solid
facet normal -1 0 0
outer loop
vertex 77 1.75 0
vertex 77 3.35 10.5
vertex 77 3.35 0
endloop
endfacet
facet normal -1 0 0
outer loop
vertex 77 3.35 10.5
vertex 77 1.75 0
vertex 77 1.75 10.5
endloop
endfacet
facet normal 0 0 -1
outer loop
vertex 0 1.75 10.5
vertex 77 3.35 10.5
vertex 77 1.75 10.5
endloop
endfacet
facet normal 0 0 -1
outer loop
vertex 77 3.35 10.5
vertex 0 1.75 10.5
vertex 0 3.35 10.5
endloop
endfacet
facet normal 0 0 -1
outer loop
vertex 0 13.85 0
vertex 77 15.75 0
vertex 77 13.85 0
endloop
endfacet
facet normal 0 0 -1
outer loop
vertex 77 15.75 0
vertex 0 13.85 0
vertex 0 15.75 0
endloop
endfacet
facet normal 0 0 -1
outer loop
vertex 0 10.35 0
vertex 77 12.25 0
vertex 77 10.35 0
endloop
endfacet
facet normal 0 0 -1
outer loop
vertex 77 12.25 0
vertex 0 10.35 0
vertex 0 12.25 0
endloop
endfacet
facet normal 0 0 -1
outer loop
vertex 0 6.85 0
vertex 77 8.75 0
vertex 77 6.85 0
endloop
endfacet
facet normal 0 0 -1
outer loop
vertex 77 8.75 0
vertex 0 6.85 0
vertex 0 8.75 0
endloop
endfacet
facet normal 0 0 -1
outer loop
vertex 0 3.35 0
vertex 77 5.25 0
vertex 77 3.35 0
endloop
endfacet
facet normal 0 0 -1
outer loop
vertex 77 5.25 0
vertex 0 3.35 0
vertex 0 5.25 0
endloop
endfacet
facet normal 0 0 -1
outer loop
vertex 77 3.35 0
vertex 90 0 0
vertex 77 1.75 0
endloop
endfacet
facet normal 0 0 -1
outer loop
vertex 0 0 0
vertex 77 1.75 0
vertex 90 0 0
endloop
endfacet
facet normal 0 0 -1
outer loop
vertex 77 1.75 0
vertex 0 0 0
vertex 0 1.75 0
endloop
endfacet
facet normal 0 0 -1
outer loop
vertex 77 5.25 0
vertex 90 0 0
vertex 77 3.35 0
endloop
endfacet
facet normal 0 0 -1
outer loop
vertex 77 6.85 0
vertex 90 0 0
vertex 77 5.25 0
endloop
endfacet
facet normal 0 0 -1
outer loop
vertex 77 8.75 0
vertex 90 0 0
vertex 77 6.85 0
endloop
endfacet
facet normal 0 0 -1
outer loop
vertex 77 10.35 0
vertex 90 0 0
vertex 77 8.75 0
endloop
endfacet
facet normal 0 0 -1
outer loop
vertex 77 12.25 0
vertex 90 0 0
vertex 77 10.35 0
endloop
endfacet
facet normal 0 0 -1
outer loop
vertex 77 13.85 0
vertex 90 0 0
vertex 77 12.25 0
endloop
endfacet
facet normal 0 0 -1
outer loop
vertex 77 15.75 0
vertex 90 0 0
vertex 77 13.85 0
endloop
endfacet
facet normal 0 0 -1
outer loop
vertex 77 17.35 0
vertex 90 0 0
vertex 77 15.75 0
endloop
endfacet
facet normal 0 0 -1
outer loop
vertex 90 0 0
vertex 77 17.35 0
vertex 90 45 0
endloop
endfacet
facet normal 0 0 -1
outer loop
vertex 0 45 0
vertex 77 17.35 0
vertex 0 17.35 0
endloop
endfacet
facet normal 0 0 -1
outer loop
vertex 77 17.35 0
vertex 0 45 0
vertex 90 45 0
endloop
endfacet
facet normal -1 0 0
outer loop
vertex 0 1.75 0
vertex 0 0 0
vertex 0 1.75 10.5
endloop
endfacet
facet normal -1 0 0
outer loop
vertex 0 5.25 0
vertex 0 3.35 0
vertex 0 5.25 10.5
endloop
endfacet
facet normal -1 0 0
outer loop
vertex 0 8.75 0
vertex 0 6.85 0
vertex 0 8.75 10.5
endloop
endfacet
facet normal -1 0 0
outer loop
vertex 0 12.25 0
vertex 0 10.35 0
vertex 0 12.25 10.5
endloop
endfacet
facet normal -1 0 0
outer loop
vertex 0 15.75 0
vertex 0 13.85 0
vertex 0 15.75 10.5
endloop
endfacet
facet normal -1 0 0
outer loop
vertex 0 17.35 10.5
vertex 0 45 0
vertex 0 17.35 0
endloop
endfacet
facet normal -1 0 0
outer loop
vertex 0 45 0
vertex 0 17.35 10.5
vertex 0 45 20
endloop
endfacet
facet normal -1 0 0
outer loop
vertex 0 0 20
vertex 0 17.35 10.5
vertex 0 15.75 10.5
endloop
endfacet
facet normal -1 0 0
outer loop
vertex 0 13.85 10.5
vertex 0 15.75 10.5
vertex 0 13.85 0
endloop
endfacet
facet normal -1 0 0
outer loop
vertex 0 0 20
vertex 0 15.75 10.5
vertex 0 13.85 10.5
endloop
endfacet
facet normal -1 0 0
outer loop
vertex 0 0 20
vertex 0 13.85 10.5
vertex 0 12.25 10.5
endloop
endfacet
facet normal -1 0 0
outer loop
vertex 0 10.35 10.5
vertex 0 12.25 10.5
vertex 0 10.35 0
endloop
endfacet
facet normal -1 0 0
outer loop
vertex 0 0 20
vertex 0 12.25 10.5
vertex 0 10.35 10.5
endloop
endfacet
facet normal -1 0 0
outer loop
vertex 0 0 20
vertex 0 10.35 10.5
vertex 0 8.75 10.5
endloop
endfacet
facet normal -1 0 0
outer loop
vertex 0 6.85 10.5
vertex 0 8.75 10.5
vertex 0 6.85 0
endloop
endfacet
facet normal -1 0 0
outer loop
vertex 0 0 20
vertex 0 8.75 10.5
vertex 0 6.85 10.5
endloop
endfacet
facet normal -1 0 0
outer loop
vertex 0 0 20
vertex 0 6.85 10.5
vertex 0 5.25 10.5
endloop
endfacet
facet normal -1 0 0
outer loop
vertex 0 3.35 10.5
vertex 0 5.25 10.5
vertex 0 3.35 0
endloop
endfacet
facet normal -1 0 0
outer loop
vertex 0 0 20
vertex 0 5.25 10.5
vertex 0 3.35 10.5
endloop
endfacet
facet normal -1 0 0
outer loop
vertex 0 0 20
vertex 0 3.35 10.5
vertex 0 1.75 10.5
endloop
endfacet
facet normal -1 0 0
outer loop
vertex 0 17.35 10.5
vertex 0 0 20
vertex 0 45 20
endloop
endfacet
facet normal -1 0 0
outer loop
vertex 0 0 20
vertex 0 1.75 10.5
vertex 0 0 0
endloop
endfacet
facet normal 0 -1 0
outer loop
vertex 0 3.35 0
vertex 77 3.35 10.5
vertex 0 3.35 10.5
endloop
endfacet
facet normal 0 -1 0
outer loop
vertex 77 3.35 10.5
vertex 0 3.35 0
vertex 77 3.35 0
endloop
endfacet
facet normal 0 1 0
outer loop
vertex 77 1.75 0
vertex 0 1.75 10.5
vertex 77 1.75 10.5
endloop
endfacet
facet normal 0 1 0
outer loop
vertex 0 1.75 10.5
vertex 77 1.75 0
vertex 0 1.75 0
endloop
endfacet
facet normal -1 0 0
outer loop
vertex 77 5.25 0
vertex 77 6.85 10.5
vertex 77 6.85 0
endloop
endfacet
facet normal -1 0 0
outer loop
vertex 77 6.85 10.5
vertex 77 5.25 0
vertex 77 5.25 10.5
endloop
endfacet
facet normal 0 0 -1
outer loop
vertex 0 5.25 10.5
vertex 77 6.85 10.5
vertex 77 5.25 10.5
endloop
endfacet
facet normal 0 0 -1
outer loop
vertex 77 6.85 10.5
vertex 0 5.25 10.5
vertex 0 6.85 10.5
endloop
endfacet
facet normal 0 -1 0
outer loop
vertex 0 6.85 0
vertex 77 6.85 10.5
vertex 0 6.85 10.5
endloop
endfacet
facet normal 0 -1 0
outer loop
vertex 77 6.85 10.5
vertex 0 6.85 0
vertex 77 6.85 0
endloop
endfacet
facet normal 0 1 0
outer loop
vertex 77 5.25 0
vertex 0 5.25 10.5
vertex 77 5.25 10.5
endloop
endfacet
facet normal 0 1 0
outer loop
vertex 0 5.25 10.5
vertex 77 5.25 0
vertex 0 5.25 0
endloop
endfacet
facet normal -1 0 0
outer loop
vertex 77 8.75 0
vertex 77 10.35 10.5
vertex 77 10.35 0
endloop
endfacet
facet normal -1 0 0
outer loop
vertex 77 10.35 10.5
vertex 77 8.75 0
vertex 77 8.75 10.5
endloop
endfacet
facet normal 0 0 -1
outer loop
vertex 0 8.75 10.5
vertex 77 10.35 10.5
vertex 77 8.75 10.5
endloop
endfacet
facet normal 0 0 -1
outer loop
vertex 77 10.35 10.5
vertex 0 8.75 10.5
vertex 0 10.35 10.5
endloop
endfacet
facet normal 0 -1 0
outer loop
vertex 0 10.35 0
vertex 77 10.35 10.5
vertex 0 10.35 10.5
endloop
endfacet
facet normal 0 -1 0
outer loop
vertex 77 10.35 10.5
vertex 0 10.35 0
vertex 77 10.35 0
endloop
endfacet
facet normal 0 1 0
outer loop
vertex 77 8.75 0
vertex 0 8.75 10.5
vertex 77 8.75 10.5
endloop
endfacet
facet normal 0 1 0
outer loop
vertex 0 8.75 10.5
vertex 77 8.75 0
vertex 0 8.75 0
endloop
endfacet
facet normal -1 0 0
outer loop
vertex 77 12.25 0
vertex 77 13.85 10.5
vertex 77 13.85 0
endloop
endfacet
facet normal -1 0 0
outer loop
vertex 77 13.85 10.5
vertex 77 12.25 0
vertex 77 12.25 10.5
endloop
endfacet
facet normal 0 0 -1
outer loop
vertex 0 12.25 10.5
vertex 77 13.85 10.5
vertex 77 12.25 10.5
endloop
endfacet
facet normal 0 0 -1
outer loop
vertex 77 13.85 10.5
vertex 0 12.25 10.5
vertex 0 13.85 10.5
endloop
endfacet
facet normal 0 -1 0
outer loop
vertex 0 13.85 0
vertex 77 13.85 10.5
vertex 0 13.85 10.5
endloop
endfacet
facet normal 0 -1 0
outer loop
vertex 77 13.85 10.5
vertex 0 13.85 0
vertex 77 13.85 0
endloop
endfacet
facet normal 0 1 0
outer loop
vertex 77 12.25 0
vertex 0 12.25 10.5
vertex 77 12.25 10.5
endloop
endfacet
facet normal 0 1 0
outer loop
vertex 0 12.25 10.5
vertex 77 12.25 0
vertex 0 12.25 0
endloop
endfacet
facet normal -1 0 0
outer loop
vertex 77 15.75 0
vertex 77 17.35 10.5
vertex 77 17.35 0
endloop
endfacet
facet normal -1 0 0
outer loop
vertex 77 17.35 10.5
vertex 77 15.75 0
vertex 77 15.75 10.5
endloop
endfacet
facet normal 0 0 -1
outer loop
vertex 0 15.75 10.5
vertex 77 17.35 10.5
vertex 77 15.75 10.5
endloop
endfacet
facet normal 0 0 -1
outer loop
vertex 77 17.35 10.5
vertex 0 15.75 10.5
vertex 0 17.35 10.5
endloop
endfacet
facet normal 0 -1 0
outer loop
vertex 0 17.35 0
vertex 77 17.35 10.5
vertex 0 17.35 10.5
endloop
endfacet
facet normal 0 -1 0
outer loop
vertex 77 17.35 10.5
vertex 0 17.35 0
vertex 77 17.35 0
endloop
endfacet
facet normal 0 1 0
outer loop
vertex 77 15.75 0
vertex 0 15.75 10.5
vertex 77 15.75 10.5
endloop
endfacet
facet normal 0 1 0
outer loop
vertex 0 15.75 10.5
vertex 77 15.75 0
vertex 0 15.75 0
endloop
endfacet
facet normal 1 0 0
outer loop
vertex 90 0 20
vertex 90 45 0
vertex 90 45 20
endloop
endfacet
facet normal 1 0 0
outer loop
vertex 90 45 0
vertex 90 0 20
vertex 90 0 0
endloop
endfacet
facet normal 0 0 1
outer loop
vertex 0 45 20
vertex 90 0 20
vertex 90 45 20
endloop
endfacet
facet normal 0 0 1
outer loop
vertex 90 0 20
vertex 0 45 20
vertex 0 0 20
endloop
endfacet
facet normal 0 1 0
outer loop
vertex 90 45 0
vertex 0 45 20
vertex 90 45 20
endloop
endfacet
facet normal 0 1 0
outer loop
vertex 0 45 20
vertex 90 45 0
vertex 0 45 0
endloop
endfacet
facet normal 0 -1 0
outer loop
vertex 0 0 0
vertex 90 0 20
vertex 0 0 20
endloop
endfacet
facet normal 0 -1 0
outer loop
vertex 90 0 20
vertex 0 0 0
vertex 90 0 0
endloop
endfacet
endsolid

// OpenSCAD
$fn = 128;

// --- Dimensions ---
// Base block dimensions
$base_length_X = 90;
$base_width_Y = 45;
$base_height_Z = 20;

// Slide dimensions (mm)
$slide_length = 75;
$slide_width = 25;
$slide_thickness = 1;

// Slot dimensions
$slot_length = 77;
$slot_width = 1.6;
$slot_depth = 10;

// Slot layout
$slot_count = 10;
$slot_spacing = 3.5; // centre-to-centre in Y
$group_centre_Y = 0; // Group of slots centred on block in Y

// --- Variables ---
// Calculate slot positions
// Total width of slots = slot_count * slot_width
// Total gap width = (slot_count - 1) * slot_spacing
// We need to center this group.
// The group of centers is at Y = group_centre_Y.
// Since we are using for loops with an offset, we can calculate the offset for the first slot.

// Calculate the offset for the first slot center to center the group
// The centers are at: y0, y0 + spacing, y0 + 2*spacing, ...
// The average of these centers should be 0.
// y0 + (slot_count - 1)/2 * spacing = 0
// y0 = - (slot_count - 1)/2 * spacing
$first_slot_offset = - (($slot_count - 1) / 2) * $slot_spacing;

// --- Build ---

difference() {
    
    // 1. Base Block
    // Rests on XY plane at z=0. Centred on origin.
    translate([0, 0, 0])
    cube([
        $base_length_X, 
        $base_width_Y, 
        $base_height_Z
    ]);

    // 2. Slots
    // Cut 10 parallel slots running along X.
    // Open at the top (Z direction).
    // Slots are 77mm long, 1.6mm wide, 10mm deep.
    // Spacing 3.5mm centre-to-centre in Y.
    // Group centred on block in X and Y.
    
    for (i = [0 : $slot_count - 1]) {
        // Calculate Y position for this slot
        $y_pos = $first_slot_offset + (i * $slot_spacing);
        
        // Slot geometry:
        // Length: 77 (along X)
        // Width: 1.6 (along Y)
        // Depth: 10 (along Z)
        // Position: Centred at (0, y_pos, 0) relative to the block face
        
        // Rule 5: Extend cutting shape slightly past faces to avoid coplanar faces
        // Extend 0.5mm in Z direction (depth)
        translate([0, $y_pos, 0])
        cube([
            $slot_length,
            $slot_width,
            $slot_depth + 0.5
        ]);
    }
}
